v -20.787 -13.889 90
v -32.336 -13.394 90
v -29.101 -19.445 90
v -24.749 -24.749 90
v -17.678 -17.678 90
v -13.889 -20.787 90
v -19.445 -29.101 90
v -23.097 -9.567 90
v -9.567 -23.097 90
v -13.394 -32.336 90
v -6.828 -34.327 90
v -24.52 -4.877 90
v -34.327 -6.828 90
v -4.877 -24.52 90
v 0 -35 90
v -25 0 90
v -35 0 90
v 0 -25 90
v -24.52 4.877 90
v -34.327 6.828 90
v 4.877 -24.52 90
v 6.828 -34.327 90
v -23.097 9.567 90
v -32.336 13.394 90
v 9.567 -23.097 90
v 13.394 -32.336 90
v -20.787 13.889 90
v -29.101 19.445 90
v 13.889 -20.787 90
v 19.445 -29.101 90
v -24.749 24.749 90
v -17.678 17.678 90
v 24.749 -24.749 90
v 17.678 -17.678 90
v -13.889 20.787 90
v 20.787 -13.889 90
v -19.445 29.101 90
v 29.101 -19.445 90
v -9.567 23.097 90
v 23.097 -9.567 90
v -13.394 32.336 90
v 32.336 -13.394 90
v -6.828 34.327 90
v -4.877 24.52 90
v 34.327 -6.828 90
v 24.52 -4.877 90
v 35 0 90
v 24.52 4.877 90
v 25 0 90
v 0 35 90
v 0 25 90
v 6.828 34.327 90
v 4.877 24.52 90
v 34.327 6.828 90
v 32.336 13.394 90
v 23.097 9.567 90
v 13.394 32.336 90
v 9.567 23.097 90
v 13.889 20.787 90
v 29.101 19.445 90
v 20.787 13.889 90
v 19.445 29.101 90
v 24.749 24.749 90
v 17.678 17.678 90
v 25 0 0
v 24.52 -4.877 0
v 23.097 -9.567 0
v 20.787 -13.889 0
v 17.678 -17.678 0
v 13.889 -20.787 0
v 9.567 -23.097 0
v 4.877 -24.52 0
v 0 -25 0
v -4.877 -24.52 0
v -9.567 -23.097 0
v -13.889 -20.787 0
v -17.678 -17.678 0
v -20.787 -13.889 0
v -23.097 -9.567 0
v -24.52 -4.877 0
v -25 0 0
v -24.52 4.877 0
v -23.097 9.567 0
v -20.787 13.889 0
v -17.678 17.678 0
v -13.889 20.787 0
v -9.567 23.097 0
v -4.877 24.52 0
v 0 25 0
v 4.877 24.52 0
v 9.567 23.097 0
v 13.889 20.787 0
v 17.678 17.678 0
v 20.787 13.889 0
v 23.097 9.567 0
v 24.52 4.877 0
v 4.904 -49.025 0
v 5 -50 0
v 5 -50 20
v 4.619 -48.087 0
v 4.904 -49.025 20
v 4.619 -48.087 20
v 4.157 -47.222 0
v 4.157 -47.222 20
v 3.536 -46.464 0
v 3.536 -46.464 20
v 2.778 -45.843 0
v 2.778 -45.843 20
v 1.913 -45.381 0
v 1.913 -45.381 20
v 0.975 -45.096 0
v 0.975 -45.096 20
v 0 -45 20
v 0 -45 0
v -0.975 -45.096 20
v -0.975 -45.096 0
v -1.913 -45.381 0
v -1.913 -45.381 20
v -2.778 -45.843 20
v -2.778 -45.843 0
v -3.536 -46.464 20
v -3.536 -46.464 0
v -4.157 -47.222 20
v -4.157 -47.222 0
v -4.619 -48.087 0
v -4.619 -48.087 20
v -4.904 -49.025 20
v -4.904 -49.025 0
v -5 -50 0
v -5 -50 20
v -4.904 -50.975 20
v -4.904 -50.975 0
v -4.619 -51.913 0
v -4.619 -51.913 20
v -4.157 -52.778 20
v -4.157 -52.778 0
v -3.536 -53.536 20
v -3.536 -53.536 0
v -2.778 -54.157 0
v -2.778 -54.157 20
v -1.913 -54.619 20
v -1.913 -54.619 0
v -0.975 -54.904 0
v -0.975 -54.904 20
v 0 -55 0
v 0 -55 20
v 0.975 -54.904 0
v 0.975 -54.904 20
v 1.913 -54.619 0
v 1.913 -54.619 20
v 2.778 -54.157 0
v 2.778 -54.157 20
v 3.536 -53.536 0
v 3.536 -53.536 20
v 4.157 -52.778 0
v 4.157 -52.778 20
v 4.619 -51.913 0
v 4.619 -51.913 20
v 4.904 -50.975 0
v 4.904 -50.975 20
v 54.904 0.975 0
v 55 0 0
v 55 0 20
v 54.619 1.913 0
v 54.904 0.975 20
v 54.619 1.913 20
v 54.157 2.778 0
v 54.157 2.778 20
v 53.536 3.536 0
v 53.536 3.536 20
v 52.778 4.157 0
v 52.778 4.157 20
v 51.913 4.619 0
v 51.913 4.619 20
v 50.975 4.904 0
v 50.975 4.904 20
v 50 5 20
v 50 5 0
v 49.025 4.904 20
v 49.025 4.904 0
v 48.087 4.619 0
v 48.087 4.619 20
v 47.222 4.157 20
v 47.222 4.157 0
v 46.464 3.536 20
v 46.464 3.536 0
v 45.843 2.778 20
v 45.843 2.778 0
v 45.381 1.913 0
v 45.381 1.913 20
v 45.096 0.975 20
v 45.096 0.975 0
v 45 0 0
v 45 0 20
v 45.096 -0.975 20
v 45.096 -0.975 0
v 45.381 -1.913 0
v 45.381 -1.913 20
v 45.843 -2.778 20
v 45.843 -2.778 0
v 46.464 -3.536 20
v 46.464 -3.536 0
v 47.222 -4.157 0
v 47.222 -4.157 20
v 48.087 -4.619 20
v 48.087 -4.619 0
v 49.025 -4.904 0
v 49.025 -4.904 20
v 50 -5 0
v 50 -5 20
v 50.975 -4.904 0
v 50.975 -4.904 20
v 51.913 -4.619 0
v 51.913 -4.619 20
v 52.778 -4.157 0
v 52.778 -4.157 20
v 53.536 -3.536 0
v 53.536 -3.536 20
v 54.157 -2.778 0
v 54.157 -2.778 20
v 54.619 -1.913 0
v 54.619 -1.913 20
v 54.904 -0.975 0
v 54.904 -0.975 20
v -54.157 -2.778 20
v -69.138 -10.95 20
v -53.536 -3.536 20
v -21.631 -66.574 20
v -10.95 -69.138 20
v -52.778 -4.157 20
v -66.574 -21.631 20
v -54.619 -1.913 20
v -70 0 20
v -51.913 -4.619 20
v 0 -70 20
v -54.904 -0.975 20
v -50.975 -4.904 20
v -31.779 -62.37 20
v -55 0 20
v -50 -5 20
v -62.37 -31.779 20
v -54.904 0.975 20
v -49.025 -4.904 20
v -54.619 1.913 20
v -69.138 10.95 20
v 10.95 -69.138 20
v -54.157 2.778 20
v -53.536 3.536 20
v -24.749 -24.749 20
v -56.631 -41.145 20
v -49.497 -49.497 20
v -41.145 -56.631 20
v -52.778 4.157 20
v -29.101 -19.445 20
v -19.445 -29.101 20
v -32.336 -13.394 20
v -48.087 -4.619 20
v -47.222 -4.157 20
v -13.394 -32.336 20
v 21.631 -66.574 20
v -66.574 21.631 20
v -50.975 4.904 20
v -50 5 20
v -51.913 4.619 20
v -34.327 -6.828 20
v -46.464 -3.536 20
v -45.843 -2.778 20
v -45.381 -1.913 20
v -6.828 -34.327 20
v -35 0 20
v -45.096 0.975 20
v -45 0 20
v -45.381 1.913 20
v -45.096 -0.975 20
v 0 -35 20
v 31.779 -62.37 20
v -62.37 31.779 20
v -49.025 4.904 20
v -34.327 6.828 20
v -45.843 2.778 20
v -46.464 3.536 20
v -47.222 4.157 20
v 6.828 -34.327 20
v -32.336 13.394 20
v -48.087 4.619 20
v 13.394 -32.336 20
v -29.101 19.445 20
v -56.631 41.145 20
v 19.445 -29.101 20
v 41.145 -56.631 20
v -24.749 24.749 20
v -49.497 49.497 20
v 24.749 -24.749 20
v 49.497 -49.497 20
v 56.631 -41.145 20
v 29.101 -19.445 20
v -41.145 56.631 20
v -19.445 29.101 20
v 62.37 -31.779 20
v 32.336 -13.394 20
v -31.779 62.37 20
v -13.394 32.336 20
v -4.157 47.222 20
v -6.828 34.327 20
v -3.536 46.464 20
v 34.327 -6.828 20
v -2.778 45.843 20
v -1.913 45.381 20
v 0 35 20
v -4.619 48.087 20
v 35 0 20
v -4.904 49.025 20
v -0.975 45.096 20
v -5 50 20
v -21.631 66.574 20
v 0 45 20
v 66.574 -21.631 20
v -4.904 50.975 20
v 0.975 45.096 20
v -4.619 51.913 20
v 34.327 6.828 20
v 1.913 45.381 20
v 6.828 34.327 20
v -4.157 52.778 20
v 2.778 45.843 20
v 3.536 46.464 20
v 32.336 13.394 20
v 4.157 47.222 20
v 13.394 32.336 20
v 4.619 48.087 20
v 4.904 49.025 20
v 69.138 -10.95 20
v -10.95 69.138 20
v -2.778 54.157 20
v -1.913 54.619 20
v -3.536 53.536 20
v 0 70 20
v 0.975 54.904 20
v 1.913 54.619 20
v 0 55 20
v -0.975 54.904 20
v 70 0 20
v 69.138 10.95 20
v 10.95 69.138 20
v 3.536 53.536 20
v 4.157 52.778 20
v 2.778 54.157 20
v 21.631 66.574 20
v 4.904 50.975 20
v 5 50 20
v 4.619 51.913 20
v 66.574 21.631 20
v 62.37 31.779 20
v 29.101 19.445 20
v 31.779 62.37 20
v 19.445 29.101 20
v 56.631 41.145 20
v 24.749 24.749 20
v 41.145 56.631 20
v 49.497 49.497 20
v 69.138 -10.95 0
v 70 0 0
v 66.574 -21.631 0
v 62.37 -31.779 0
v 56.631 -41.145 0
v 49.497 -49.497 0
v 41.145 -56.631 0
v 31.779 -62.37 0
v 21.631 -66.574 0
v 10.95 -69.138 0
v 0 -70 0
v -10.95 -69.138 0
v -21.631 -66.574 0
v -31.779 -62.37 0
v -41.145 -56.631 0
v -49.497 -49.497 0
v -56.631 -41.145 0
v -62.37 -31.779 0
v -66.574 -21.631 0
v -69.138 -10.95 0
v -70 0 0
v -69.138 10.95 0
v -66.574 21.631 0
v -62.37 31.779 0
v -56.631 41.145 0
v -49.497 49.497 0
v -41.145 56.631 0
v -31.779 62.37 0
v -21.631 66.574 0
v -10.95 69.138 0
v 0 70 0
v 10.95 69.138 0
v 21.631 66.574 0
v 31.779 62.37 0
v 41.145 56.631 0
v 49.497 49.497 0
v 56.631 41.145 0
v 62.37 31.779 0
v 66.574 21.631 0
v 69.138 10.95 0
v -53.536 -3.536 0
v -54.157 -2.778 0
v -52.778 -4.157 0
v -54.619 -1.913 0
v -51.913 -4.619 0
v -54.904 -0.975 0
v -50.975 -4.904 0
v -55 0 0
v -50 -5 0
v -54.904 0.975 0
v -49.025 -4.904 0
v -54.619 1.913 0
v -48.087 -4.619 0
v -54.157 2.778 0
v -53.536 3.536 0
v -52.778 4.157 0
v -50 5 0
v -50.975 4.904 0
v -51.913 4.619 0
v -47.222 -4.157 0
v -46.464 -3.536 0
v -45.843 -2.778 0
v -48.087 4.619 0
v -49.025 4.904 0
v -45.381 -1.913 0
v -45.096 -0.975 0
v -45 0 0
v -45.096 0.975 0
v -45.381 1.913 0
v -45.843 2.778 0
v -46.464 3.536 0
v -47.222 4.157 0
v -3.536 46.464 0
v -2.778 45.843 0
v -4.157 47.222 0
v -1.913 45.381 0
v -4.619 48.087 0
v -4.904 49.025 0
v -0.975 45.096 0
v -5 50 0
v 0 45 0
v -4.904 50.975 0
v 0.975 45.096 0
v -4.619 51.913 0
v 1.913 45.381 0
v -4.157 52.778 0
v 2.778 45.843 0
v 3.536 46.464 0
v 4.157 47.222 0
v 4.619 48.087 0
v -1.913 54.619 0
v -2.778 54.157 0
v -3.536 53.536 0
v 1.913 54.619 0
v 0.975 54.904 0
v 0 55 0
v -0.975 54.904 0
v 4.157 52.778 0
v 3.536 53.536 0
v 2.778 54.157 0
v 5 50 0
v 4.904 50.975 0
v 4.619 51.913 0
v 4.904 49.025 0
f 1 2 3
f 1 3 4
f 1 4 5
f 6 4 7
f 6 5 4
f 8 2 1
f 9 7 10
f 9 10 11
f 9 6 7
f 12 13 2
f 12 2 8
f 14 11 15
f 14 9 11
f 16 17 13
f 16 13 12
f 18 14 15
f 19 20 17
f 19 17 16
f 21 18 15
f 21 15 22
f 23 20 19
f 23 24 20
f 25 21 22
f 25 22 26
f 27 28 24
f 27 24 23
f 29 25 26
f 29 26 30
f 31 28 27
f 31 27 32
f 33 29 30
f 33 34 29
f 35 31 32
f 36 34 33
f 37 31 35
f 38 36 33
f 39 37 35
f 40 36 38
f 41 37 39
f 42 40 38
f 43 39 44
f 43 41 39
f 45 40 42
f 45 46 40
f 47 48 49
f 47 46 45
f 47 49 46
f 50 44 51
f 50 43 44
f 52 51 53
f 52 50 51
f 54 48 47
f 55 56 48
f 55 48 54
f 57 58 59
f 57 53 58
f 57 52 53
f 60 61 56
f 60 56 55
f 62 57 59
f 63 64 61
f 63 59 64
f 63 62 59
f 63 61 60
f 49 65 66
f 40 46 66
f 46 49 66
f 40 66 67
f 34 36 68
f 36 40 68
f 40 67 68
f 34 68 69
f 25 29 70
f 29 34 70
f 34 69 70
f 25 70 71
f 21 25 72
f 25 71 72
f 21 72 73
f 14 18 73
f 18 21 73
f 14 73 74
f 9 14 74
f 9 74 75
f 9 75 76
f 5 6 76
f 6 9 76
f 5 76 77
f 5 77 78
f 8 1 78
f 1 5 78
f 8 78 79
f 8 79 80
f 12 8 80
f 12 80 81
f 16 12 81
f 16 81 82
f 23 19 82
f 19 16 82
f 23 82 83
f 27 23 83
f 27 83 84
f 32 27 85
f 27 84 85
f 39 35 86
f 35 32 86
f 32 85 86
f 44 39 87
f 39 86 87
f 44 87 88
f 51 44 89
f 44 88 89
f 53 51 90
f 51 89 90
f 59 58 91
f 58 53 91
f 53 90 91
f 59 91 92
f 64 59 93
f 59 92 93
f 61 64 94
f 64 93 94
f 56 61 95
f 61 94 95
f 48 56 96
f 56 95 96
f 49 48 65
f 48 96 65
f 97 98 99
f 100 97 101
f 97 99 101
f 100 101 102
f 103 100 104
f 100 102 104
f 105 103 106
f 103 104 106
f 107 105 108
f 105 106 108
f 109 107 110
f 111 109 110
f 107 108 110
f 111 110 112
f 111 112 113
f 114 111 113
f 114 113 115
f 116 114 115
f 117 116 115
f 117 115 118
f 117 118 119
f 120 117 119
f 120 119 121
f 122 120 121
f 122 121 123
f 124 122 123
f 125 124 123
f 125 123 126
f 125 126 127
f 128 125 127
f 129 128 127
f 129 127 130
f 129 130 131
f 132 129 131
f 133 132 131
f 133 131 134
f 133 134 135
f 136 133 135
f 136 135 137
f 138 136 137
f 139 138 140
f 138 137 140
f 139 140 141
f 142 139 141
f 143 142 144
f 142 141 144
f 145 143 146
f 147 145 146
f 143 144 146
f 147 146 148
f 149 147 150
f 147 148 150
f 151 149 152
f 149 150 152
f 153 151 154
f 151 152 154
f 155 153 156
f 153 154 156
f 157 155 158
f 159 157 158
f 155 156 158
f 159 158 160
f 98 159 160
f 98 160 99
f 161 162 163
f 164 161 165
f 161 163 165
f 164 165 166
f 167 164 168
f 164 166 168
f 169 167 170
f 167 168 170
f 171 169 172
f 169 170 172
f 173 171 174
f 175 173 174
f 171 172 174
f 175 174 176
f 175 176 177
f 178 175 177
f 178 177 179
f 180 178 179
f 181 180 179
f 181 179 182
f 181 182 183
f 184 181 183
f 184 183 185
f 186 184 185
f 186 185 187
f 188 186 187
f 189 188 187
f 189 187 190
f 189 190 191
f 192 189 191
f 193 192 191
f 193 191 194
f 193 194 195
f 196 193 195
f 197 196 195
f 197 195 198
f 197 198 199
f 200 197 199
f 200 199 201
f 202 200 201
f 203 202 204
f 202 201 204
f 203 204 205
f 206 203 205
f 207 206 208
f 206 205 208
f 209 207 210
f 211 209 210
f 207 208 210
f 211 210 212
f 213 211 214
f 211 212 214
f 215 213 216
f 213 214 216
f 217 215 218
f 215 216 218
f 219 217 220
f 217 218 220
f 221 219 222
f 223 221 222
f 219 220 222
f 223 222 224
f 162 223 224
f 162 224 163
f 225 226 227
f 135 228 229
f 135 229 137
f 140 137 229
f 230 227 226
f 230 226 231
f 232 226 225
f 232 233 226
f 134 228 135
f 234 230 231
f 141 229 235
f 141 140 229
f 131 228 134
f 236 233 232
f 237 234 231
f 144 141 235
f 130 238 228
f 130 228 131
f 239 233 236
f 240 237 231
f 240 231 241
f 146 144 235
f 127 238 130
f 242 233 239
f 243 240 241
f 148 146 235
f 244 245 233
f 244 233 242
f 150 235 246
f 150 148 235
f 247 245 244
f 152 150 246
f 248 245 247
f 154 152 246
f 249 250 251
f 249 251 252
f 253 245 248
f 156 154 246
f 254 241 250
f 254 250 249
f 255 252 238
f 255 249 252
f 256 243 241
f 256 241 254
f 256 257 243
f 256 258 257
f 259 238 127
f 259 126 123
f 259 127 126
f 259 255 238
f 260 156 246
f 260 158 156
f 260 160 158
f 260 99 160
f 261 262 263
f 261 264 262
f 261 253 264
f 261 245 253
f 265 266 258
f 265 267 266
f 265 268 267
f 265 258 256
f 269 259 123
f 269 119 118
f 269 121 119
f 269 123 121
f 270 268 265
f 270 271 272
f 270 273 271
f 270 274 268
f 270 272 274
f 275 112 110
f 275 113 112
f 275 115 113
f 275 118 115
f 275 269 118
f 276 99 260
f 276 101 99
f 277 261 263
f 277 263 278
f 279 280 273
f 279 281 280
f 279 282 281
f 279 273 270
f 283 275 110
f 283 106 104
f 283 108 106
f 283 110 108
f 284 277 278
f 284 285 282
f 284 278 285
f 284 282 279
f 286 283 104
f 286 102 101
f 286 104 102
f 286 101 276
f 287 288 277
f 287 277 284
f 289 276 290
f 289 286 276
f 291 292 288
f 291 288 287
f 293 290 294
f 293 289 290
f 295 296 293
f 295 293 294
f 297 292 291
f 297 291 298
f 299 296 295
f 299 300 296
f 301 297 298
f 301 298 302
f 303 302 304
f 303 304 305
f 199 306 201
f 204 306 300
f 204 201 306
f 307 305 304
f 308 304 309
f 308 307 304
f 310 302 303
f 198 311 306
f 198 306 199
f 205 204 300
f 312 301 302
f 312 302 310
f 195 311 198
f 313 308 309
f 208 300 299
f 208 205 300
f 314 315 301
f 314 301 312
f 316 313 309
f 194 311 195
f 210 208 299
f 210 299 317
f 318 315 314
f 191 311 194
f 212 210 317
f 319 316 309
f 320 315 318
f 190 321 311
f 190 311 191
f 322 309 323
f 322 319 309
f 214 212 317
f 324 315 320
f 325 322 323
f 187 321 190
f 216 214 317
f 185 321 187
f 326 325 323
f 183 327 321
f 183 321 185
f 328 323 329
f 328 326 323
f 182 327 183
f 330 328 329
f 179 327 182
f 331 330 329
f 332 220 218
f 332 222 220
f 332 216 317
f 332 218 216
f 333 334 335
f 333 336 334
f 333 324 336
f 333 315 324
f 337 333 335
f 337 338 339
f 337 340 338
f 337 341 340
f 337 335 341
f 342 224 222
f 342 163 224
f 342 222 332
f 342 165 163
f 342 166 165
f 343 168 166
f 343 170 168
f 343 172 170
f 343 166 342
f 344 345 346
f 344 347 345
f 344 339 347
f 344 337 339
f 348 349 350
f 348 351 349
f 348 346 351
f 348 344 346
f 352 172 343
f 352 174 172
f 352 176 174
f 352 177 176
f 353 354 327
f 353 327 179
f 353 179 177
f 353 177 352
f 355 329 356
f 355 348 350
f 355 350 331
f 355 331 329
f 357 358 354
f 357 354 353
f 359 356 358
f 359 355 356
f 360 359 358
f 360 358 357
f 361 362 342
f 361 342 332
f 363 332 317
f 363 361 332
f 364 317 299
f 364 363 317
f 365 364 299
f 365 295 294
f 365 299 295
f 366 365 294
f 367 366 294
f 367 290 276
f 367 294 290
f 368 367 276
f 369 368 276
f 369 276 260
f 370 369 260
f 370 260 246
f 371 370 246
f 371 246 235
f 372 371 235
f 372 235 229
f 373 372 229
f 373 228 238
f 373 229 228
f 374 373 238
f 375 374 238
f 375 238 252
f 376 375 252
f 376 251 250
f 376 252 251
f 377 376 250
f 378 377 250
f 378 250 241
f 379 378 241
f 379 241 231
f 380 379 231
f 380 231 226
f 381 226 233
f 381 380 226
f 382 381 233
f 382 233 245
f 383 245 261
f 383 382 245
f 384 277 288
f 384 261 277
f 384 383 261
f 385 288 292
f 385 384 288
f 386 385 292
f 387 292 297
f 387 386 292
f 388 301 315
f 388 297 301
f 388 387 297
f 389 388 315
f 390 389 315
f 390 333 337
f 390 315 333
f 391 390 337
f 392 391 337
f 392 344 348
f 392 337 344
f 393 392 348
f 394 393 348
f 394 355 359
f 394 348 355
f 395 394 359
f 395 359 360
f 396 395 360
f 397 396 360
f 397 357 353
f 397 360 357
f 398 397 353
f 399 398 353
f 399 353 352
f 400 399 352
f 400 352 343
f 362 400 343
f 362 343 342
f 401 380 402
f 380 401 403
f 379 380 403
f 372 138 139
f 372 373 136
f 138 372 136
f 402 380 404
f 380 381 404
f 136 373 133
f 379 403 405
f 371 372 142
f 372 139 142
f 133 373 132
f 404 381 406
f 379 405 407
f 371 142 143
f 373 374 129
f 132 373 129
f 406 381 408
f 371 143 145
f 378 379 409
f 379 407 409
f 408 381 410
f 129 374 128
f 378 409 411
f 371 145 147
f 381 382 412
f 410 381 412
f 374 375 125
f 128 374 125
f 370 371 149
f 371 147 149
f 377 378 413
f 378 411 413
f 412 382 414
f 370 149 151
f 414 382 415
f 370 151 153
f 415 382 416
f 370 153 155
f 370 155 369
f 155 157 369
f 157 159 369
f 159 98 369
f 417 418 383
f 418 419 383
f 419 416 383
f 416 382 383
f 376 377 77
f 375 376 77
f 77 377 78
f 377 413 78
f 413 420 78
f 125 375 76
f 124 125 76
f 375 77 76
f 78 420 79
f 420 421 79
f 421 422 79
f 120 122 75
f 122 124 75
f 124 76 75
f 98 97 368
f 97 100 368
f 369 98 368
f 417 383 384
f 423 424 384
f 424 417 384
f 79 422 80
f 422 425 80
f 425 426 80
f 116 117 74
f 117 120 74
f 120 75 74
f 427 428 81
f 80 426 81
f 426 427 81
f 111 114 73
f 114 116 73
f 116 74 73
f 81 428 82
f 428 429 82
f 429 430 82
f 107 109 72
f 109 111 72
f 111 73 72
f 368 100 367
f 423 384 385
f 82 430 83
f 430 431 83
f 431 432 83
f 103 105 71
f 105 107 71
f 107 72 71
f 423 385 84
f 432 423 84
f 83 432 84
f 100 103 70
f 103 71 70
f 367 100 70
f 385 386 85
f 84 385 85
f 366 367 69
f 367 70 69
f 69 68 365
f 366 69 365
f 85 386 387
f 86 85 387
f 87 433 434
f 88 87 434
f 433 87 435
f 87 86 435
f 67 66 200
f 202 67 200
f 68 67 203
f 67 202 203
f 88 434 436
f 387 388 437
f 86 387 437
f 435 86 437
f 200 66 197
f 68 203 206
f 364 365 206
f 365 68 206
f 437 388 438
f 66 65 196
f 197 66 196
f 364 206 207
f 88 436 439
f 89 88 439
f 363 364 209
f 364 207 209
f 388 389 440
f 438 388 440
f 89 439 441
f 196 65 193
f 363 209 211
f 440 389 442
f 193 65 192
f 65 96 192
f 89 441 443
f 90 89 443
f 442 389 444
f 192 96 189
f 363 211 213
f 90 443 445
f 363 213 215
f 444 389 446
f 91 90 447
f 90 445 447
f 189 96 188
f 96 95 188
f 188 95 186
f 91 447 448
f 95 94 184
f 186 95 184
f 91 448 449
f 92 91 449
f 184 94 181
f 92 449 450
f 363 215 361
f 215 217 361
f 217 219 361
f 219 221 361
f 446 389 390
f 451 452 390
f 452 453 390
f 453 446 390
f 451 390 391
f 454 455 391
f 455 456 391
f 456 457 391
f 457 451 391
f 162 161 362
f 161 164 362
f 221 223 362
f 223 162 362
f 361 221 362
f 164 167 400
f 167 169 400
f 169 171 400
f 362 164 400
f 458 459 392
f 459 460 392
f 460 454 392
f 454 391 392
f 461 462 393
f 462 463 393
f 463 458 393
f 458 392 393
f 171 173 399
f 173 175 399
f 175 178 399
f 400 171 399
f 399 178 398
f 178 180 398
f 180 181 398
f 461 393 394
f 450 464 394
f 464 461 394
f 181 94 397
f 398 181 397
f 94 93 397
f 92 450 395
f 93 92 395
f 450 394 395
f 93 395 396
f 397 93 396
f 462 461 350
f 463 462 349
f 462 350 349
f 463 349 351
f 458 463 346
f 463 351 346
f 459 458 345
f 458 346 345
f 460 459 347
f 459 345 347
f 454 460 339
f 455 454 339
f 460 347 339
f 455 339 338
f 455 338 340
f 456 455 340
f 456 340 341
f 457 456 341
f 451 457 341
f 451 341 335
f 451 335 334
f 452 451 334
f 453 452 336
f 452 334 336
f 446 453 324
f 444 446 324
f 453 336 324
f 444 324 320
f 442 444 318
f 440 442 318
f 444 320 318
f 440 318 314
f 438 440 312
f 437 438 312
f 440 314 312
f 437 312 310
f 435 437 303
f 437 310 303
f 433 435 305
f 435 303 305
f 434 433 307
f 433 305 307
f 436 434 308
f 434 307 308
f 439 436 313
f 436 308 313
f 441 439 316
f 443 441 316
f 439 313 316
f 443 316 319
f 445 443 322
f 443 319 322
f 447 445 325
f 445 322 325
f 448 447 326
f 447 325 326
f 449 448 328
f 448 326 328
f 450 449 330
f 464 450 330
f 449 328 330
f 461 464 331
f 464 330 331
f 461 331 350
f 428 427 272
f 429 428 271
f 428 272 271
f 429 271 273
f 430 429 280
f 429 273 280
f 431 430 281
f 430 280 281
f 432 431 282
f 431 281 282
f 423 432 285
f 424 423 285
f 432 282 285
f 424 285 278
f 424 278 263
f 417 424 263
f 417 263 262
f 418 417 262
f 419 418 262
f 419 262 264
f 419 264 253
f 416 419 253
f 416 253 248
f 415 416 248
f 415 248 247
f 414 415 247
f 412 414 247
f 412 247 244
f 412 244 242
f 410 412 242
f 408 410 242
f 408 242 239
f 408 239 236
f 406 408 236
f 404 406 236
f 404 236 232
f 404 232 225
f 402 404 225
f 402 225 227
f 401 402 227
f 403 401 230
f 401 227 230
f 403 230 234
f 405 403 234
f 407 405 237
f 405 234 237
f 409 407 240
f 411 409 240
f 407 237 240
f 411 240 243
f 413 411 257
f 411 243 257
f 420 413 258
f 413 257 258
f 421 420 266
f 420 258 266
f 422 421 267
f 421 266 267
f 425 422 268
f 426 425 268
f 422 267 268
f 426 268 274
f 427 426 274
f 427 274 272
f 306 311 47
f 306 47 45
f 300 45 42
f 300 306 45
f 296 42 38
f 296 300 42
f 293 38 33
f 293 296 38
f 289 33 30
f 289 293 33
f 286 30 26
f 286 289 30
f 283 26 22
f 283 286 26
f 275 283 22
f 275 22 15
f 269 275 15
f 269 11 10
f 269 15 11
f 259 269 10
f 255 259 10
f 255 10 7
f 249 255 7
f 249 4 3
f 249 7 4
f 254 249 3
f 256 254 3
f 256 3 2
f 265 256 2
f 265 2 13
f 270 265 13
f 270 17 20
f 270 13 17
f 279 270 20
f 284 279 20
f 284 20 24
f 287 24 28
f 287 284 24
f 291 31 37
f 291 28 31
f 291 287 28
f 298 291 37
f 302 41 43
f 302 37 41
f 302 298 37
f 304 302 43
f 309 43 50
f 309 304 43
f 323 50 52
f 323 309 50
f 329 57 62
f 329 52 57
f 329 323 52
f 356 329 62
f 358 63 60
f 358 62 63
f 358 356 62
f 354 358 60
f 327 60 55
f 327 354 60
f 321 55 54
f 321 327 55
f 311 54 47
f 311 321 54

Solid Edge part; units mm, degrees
sketch "Sketch1" plane through (0, 0, 0) normal (0, 0, 1) x (1, 0, 0)
  circle A0 centre (0, 0) radius 70
  circle A1 centre (0, 0) radius 35
  dimension "D1" = 140
  dimension "D2" = 100
  dimension "D3" = 70
  dimension "D4" = 50
extrude "Protrusion1" add sketch "Sketch1" along normal blind 20
sketch "Sketch2" plane through (0, 0, 0) normal (0, 0, 1) x (1, 0, 0)
  circle A0 centre (0, 0) radius 35
  circle A1 centre (0, 0) radius 25
  dimension "D1" = 140
  dimension "D2" = 100
  dimension "D3" = 70
  dimension "D4" = 50
extrude "ExtrudedProtrusion_12" add sketch "Sketch2" along normal blind 90
sketch "Sketch3" plane through (0, 0, 20) normal (0, 0, 1) x (1, 0, 0)
  circle A0 centre (-50, 0) radius 5
  circle A1 centre (0, 50) radius 5
  circle A2 centre (50, 0) radius 5
  circle A3 centre (0, -50) radius 5
extrude "Cutout1" cut sketch "Sketch3" against normal up to vertex (20 mm away)
